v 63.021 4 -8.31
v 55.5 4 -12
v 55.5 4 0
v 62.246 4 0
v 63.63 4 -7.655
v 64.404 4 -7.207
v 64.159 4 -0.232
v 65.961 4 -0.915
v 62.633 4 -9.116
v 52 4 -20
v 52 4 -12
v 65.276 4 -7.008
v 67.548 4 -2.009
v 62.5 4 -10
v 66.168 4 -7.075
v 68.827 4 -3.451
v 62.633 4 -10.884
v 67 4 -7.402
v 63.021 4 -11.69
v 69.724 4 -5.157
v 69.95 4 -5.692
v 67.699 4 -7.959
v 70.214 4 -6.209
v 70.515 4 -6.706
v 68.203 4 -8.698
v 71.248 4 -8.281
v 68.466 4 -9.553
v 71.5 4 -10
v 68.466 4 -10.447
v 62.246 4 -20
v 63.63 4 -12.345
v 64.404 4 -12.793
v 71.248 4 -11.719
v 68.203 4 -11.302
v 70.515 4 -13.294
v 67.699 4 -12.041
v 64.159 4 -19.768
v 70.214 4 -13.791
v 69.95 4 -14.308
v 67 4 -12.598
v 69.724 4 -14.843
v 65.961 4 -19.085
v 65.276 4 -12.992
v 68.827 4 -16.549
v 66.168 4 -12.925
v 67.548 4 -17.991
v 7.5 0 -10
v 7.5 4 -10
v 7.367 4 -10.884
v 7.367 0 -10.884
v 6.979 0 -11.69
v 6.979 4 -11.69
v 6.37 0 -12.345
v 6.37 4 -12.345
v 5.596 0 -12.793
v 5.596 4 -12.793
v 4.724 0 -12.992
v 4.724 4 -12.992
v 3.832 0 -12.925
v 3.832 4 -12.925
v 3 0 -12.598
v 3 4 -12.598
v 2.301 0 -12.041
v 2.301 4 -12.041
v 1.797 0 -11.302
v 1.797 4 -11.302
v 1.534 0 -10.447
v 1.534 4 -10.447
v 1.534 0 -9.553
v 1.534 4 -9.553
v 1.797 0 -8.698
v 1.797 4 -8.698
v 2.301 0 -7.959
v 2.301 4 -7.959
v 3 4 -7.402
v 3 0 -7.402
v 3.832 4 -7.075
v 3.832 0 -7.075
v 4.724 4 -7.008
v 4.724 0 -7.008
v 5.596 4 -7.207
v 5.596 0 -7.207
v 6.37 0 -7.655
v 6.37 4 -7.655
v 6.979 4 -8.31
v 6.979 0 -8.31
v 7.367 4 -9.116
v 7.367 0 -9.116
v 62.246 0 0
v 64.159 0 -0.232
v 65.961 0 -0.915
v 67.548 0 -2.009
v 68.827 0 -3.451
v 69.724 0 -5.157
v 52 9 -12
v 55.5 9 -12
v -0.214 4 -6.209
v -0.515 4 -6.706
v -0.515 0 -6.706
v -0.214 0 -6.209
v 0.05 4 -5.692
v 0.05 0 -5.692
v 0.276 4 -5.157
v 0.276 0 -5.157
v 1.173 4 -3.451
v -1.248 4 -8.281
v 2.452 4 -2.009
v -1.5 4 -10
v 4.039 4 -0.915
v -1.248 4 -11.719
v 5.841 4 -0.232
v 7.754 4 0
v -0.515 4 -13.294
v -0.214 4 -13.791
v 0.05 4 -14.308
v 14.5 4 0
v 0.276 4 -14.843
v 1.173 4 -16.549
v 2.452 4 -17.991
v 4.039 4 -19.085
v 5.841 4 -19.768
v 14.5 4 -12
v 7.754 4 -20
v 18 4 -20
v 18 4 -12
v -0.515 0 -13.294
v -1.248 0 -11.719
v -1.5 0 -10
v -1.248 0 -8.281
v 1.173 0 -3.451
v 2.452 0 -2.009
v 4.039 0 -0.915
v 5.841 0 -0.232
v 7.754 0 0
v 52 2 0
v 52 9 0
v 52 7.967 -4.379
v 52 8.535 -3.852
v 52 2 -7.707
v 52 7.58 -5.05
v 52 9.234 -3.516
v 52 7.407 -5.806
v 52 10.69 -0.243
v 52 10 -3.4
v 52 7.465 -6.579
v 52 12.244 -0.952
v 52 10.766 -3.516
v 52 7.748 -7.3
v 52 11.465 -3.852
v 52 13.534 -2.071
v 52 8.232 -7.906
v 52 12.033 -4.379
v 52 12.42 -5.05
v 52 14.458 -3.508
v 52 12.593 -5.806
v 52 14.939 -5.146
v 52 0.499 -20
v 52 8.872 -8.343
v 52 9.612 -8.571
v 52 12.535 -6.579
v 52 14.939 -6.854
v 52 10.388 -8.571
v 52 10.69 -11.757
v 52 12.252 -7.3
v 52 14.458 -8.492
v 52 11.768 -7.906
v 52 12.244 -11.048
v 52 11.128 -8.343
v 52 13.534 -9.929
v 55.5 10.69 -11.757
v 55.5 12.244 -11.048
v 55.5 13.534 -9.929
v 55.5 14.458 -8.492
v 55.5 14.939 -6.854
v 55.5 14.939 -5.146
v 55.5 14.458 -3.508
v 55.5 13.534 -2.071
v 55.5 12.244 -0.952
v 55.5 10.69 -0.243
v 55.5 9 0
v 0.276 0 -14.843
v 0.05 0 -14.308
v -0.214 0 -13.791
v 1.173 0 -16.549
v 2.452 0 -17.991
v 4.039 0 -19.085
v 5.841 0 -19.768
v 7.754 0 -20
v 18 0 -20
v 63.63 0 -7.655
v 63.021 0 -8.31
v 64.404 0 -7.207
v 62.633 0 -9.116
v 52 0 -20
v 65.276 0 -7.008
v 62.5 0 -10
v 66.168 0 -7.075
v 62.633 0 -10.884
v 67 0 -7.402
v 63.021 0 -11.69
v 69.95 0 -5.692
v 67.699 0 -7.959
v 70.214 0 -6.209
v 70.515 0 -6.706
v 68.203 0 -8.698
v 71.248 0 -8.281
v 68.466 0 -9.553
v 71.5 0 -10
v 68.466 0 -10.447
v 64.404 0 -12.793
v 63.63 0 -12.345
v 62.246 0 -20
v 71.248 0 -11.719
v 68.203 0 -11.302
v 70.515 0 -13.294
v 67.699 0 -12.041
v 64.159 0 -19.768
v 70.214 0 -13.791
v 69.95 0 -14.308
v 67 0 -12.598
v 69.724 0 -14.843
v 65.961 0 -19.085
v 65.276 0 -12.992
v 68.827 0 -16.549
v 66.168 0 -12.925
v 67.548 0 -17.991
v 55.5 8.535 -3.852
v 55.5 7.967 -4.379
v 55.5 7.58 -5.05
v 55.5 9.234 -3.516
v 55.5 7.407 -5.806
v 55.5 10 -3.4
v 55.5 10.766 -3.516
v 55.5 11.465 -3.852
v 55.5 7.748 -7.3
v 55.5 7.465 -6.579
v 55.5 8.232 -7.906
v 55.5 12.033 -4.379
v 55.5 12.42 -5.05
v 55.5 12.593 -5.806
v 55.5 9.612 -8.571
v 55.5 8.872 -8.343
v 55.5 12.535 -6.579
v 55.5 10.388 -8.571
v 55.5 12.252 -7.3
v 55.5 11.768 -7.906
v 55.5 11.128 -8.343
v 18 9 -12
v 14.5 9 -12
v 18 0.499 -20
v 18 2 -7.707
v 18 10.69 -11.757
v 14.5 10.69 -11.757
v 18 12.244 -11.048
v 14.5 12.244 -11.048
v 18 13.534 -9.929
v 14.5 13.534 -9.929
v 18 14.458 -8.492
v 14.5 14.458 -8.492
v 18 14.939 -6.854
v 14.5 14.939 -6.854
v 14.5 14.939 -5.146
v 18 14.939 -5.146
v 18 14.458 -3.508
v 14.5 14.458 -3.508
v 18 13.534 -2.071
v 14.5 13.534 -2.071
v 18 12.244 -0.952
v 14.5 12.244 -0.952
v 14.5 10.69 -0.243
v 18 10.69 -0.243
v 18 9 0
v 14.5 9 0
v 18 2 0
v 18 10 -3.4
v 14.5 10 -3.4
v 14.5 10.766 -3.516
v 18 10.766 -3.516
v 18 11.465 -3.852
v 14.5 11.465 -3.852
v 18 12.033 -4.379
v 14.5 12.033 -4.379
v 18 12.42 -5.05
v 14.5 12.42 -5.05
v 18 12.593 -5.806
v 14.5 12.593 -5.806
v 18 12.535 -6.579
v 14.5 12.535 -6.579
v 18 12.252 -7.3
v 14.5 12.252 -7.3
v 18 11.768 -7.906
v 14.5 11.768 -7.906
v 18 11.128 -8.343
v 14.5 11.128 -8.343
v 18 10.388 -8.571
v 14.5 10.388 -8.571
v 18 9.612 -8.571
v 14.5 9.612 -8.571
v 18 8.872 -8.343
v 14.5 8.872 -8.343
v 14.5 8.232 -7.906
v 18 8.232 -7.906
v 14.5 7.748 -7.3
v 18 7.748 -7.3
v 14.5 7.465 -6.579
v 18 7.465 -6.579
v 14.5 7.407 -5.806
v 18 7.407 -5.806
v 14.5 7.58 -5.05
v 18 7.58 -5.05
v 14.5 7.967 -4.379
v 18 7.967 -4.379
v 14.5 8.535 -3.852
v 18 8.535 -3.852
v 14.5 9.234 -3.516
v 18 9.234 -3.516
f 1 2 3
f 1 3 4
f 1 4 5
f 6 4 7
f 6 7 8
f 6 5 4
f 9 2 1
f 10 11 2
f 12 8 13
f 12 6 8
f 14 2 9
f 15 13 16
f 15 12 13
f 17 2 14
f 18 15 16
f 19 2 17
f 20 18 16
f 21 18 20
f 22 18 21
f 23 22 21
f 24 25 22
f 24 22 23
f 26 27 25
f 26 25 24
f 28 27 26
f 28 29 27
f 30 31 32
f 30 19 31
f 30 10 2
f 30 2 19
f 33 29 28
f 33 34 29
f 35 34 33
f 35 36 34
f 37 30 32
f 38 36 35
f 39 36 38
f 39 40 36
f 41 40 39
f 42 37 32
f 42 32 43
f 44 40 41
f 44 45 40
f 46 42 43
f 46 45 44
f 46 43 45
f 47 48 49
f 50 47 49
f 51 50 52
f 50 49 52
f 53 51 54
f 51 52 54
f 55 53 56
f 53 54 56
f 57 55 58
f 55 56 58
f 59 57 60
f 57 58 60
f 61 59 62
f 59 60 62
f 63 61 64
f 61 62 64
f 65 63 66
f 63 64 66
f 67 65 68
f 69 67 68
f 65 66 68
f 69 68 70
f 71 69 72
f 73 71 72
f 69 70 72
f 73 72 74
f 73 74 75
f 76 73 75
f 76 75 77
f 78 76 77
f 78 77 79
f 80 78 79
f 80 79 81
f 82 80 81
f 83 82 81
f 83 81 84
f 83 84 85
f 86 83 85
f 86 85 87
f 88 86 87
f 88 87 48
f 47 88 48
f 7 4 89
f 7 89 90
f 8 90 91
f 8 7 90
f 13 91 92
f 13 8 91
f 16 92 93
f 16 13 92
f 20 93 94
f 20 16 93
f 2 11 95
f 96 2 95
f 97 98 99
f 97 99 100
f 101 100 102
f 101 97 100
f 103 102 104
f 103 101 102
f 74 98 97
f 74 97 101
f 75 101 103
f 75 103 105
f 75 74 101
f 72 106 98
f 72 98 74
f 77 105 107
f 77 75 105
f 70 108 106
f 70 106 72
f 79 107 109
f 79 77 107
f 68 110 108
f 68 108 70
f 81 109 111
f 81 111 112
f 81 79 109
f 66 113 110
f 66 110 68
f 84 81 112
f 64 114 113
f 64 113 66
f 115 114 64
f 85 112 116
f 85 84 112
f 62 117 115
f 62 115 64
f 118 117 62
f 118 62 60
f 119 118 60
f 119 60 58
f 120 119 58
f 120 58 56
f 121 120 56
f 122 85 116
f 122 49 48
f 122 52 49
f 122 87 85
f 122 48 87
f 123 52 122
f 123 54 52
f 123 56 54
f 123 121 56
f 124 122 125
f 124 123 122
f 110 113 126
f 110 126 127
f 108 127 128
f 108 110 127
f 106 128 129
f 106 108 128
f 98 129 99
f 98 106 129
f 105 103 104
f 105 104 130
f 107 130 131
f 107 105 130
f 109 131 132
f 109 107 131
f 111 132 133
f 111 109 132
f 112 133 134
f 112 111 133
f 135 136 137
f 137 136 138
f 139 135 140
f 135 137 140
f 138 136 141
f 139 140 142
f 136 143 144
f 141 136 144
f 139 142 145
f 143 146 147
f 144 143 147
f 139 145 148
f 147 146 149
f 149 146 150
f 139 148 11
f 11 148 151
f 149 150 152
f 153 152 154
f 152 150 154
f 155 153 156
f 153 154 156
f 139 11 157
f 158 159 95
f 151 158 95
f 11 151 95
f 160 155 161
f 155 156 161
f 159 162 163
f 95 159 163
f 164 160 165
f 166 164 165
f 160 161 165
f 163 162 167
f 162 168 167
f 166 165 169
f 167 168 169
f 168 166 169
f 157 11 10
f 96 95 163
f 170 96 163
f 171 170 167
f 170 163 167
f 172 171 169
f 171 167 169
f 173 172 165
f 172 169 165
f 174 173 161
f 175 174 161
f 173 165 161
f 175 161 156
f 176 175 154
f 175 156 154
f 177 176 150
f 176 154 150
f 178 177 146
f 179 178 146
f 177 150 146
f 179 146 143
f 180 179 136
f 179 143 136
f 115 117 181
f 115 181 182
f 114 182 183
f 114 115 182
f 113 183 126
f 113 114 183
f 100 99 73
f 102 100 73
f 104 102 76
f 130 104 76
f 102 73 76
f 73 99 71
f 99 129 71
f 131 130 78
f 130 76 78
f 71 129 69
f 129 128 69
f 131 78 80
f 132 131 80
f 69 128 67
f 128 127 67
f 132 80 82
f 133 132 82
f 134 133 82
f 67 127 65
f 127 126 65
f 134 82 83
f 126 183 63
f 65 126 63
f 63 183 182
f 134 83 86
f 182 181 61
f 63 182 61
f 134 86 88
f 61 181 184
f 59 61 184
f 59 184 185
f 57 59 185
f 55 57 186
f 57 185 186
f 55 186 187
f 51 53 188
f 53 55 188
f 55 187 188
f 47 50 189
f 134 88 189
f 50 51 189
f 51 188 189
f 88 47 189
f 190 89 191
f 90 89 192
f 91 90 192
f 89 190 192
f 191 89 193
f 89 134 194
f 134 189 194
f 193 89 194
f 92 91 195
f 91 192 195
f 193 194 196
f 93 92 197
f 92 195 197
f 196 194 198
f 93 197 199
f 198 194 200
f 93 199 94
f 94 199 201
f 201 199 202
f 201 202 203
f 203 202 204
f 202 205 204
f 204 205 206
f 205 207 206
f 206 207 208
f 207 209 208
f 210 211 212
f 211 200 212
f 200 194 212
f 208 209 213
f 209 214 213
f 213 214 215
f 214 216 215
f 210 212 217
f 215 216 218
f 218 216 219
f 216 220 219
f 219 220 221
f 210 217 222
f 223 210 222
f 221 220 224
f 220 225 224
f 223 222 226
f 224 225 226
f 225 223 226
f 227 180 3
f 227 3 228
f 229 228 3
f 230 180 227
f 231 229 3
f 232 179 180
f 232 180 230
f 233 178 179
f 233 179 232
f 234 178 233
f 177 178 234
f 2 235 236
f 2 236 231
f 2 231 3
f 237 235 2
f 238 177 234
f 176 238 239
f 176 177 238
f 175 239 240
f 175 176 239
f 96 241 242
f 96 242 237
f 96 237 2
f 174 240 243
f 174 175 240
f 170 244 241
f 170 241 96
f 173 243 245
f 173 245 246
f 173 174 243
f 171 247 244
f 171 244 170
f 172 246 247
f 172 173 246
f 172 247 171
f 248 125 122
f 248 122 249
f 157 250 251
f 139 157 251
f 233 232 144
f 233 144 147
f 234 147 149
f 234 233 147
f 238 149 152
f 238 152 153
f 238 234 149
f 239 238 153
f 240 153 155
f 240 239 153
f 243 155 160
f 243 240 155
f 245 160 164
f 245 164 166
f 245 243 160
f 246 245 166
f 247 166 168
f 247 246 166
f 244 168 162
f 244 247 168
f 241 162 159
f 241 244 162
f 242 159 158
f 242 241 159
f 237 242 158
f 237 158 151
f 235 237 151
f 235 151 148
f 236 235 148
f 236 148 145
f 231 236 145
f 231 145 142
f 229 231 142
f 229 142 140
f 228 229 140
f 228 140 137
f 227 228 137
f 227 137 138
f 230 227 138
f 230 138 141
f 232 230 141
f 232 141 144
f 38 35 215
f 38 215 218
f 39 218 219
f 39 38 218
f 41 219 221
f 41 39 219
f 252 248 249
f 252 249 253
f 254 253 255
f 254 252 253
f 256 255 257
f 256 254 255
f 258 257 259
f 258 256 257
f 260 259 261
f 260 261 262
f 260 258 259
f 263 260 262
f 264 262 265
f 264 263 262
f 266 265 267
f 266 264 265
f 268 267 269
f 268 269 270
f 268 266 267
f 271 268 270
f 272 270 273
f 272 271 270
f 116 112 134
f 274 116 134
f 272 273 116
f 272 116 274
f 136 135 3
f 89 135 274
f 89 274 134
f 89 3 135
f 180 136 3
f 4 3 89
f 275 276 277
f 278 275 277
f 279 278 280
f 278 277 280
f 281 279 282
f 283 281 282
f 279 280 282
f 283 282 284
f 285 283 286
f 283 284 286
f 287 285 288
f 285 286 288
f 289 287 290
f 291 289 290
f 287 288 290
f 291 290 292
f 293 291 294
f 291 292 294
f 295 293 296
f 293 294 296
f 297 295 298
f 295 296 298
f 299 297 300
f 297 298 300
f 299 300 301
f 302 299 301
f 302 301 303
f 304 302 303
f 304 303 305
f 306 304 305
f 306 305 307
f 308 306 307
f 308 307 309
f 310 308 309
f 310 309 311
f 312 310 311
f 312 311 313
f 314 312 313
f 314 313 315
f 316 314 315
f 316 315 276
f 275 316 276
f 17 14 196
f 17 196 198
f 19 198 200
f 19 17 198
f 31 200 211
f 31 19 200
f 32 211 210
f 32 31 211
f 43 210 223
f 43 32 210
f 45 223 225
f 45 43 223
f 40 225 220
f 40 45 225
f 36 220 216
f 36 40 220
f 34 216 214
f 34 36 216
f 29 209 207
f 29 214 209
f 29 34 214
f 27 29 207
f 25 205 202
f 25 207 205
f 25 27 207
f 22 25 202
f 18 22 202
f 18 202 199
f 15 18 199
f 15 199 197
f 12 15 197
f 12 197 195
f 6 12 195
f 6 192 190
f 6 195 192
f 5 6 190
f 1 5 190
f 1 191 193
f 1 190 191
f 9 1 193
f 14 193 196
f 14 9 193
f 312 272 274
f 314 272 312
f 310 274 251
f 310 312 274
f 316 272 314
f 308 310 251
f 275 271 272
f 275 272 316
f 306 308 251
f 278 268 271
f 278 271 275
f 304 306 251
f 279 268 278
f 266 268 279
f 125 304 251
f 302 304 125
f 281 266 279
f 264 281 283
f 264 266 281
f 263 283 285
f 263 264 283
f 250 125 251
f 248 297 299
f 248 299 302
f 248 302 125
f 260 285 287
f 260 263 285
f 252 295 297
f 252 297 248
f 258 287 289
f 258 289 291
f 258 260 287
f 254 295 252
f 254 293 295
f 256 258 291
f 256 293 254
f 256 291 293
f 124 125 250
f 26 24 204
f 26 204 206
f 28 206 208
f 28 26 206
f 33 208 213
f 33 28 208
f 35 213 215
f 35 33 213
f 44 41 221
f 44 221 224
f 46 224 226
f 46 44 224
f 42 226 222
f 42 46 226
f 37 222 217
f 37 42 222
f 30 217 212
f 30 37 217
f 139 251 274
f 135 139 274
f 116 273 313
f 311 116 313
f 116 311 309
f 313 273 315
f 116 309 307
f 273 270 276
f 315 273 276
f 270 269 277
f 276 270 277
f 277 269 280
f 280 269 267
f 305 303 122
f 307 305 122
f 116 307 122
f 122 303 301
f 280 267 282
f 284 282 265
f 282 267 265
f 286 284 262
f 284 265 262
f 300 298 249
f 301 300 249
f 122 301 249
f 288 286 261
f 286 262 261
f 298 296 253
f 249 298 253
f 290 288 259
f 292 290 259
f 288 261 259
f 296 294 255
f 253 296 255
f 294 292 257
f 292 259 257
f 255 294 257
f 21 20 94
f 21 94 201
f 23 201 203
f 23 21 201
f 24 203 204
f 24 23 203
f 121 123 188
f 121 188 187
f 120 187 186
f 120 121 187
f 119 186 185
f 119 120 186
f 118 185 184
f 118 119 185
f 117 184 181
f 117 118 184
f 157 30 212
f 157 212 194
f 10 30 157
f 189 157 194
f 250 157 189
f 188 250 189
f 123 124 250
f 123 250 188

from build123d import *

# Parameters (mm, degrees)
BOSS_EXTRUDE1_DEPTH             = 4
CUT_EXTRUDE1_DEPTH              = 34
BOSS_EXTRUDE2_DEPTH             = 3.5
F_5_2_5_2_DIAMETER_HOLE1_REACH  = 64.241
F_5_2_5_2_DIAMETER_HOLE1_BORE_R = 2.6
F_6_0_6_DIAMETER_HOLE1_D        = 6
F_6_0_6_DIAMETER_HOLE1_DEPTH    = 15


with BuildPart() as part:
    # Sketch1 → Boss-Extrude1 (new body)
    with BuildSketch(Plane(origin=(0, 4, 0), x_dir=(1, 0, 0), z_dir=(0, 1, 0))):
        with BuildLine():
            Line((7.753999476, 0), (62.246000524, 0))
            ThreePointArc((62.246000524, 0), (66.787860981, 1.414295513), (69.723838222, 5.157124101))
            ThreePointArc((69.723838222, 5.157124101), (70.077199101, 5.953180748), (70.515003965, 6.706106372))
            ThreePointArc((70.515003965, 6.706106372), (71.5, 10), (70.515003965, 13.293893628))
            ThreePointArc((70.515003965, 13.293893628), (70.077199101, 14.046819252), (69.723838222, 14.842875899))
            ThreePointArc((69.723838222, 14.842875899), (66.787860981, 18.585704487), (62.246000524, 20))
            Line((62.246000524, 20), (52, 20))
            add(Edge.make_bspline(
                [(18, 20), (29.333333333, 20), (40.666666667, 20), (52, 20)],
                knots=[0, 0, 0, 0, 1, 1, 1, 1], degree=3))
            Line((18, 20), (7.753999476, 20))
            ThreePointArc((7.753999476, 20), (3.212139019, 18.585704487), (0.276161778, 14.842875899))
            ThreePointArc((0.276161778, 14.842875899), (-0.077199101, 14.046819252), (-0.515003965, 13.293893628))
            ThreePointArc((-0.515003965, 13.293893628), (-1.5, 10), (-0.515003965, 6.706106372))
            ThreePointArc((-0.515003965, 6.706106372), (-0.077199101, 5.953180748), (0.276161778, 5.157124101))
            ThreePointArc((0.276161778, 5.157124101), (3.212139019, 1.414295513), (7.753999476, 0))
        make_face()
    extrude(amount=-BOSS_EXTRUDE1_DEPTH)

    # Sketch2 → Cut-Extrude1 (cut)
    with BuildSketch(Plane(origin=(18, 0, 0), x_dir=(0, -1, 0), z_dir=(-1, 0, 0))):
        Polygon((-2, 0), (-4, 0), (-4, -20), (-0.499398694, -20), (-2, -7.707188193), align=None)
    extrude(amount=-CUT_EXTRUDE1_DEPTH, mode=Mode.SUBTRACT)

    # Sketch3 → Boss-Extrude2 (add)
    with BuildSketch(Plane(origin=(18, 0, 0), x_dir=(0, 0, -1), z_dir=(1, 0, 0))):
        with BuildLine():
            Line((0, 4), (12, 4))
            Line((12, 4), (12, 9))
            ThreePointArc((12, 9), (6, 15), (0, 9))
            Line((0, 9), (0, 4))
        make_face()
    boss_extrude2 = extrude(amount=-BOSS_EXTRUDE2_DEPTH)

    # Mirror1: Boss-Extrude2 across plane
    add(boss_extrude2.mirror(Plane.ZY.offset(-35)))

    # Ø5.2 (5.2) Diameter Hole1 bore → Ø5.2 (5.2) Diameter Hole1 (cut, up to next)
    with BuildSketch(Plane.ZY.offset(-14.5), mode=Mode.PRIVATE) as f_5_2_5_2_diameter_hole1_sk1:
        with Locations((-6, 10)):
            Circle(F_5_2_5_2_DIAMETER_HOLE1_BORE_R)
    f_5_2_5_2_diameter_hole1_tool1 = extrude(f_5_2_5_2_diameter_hole1_sk1.sketch, amount=-F_5_2_5_2_DIAMETER_HOLE1_REACH, mode=Mode.PRIVATE) & part.part
    f_5_2_5_2_diameter_hole1 = f_5_2_5_2_diameter_hole1_tool1.solids().sort_by_distance((14.5, 10, -6))[0]
    add(f_5_2_5_2_diameter_hole1, mode=Mode.SUBTRACT)

    # Ø6.0 (6) Diameter Hole1
    with Locations(Plane(origin=(0, 0, 0), x_dir=(-1, 0, 0), z_dir=(0, -1, 0))):
        with Locations((-4.5, 10)):
            f_6_0_6_diameter_hole1 = Hole(F_6_0_6_DIAMETER_HOLE1_D / 2, depth=F_6_0_6_DIAMETER_HOLE1_DEPTH)

    # Mirror2: Ø5.2 (5.2) Diameter Hole1, Ø6.0 (6) Diameter Hole1 across plane
    add(f_5_2_5_2_diameter_hole1.mirror(Plane.ZY.offset(-35)), mode=Mode.SUBTRACT)
    add(f_6_0_6_diameter_hole1.mirror(Plane.ZY.offset(-35)), mode=Mode.SUBTRACT)


solid = part.part
